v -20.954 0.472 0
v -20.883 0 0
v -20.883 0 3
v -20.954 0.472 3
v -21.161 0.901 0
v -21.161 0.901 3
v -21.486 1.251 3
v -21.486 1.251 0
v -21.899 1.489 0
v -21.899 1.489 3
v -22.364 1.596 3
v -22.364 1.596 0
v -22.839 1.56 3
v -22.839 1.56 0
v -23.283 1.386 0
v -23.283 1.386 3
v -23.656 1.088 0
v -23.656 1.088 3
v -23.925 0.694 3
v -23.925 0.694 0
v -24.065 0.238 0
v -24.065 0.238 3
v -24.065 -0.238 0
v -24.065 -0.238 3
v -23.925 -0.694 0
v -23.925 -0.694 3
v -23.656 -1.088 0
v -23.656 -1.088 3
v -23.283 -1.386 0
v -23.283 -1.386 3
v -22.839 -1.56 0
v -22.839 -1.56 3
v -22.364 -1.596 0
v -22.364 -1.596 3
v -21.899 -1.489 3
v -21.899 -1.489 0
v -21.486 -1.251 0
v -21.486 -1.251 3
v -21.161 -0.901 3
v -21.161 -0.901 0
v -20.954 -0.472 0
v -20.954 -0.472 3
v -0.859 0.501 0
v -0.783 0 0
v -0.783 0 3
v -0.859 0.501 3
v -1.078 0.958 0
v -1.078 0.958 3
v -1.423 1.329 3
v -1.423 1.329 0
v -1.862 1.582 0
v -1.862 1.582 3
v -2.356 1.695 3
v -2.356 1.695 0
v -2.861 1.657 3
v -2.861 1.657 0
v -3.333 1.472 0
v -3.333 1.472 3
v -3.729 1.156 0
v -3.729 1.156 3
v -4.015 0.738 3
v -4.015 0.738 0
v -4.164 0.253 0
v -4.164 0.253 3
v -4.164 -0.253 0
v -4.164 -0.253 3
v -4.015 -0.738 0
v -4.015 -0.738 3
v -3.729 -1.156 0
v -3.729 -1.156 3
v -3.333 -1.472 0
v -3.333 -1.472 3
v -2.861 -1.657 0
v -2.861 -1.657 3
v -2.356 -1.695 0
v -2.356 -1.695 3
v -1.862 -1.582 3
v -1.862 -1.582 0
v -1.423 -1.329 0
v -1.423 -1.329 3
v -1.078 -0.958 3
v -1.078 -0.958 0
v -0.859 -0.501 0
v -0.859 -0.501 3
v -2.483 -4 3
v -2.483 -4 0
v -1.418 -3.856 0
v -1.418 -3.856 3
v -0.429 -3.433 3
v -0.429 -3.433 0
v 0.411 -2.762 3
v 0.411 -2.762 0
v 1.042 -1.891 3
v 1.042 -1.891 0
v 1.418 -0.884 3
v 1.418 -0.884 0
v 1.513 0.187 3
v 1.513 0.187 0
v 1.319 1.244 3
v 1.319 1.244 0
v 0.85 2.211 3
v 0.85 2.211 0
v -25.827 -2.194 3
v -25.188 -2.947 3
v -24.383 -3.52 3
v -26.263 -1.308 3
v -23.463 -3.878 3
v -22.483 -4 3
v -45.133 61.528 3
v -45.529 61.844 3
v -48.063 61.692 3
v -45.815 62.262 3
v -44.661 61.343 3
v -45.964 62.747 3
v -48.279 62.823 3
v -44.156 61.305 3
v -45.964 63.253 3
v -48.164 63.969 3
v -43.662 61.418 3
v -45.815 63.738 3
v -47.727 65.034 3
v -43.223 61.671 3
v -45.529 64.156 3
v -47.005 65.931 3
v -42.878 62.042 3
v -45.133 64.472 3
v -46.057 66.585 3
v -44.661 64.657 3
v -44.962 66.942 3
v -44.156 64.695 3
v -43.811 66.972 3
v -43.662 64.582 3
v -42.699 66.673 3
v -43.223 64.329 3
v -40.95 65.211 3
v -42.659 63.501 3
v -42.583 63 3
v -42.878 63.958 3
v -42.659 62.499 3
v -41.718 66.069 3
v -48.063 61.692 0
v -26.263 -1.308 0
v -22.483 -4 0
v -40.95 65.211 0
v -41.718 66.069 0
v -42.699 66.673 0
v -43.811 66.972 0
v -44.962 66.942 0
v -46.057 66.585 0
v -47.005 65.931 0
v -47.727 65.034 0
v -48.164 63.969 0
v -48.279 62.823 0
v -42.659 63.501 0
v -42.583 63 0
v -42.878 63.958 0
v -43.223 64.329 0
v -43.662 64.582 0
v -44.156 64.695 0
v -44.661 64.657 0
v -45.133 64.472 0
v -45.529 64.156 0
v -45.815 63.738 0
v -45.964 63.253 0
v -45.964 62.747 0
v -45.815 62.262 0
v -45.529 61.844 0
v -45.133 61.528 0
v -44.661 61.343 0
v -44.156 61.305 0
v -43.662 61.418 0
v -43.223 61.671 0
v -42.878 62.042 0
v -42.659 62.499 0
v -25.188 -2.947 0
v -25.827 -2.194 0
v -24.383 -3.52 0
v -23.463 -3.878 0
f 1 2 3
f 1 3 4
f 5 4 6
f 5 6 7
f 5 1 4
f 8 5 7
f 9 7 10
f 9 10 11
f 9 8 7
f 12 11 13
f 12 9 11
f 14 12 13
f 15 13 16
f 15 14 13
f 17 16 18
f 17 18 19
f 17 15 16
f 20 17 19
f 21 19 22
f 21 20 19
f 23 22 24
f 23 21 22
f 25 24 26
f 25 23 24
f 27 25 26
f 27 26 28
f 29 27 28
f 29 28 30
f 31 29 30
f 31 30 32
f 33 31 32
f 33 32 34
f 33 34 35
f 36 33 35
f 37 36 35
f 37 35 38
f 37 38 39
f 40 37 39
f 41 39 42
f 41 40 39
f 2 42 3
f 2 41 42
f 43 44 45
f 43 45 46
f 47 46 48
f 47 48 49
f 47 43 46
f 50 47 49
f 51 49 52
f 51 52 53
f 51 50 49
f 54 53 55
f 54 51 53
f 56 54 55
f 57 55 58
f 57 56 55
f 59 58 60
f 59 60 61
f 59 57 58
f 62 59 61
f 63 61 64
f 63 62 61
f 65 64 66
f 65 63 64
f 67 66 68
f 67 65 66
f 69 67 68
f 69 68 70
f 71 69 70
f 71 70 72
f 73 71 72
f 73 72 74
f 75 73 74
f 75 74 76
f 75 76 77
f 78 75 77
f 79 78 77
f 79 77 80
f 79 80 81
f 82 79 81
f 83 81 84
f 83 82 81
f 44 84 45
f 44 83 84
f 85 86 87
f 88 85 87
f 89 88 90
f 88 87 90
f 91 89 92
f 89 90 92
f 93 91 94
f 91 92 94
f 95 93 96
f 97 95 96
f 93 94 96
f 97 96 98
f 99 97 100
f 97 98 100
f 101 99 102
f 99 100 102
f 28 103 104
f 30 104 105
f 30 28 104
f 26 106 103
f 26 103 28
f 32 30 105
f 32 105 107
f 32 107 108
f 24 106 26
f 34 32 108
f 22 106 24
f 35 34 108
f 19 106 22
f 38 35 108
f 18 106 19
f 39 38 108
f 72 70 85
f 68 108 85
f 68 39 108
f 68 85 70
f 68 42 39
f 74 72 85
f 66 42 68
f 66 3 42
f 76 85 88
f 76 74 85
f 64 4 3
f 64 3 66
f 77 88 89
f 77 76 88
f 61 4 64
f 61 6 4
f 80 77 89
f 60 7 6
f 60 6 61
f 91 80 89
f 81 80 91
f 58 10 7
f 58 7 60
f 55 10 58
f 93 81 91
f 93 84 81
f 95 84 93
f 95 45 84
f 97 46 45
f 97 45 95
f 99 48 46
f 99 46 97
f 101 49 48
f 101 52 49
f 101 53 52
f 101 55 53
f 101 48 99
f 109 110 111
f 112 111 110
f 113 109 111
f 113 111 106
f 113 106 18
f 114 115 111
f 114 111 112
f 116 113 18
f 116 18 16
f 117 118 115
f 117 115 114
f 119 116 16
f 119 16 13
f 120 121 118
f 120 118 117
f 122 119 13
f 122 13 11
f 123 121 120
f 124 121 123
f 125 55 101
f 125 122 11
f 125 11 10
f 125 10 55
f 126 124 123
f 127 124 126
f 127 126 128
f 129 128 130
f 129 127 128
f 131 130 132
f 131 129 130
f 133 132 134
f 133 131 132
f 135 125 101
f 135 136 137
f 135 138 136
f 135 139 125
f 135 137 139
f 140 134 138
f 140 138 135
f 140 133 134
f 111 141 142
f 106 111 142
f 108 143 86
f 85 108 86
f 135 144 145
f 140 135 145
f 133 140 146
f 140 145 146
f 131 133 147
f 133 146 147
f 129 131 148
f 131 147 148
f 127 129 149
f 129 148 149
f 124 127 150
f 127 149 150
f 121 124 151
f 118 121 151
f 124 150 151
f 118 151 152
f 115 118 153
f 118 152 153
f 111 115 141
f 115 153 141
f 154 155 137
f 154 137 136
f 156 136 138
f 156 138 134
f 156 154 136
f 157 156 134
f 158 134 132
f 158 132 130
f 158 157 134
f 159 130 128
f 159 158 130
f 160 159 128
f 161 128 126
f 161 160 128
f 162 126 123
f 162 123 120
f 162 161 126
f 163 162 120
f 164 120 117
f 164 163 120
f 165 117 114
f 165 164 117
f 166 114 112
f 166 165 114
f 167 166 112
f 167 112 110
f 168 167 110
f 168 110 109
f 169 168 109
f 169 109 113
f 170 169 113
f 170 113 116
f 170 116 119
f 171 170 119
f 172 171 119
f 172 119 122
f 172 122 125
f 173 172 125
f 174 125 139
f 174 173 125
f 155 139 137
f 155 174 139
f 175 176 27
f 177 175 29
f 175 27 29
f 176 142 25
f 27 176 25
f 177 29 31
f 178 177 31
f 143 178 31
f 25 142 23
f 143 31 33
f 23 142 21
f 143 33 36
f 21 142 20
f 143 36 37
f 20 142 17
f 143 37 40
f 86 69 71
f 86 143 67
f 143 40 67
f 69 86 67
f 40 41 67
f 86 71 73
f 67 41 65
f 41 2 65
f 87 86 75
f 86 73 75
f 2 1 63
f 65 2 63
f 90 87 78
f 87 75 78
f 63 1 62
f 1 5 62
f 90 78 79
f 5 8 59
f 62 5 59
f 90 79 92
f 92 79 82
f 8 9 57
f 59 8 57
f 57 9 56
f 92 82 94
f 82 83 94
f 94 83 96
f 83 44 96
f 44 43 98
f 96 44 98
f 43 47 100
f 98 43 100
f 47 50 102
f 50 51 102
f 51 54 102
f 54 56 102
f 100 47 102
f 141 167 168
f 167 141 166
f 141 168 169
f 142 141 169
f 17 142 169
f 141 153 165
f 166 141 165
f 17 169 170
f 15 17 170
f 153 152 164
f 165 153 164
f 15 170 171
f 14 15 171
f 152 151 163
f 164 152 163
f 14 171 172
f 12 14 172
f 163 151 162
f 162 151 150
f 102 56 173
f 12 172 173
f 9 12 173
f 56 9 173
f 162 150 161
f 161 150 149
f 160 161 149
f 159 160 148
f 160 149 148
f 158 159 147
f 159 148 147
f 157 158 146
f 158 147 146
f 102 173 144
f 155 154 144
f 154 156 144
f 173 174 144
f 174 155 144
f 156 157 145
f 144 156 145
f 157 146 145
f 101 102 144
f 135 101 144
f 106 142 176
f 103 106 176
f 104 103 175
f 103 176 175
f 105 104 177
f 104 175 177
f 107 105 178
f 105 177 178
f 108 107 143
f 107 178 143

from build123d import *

# Parameters (mm, degrees)
SKETCH_1_R      = 1.6
SKETCH_1_R_2    = 1.7
SKETCH_1_R_3    = 4
EXTRUDE_1_DEPTH = 3


with BuildPart() as part:
    # 草图1 → 凸台-拉伸1 (new body)
    # profile 1 of 3: a face of its own
    with BuildSketch(Plane.XY):
        with BuildLine():
            Line((-2.4830952, 4), (-22.4830952, 4))
            ThreePointArc((-22.4830952, 4), (-25.741324807, 2.320331836), (-26.263182143, -1.308030085))
            ThreePointArc((-26.263182143, -1.308030085), (-24.803427036, -3.258229607), (-22.4830952, -4))
            Line((-22.4830952, -4), (-2.4830952, -4))
            ThreePointArc((-2.4830952, -4), (1.041523919, -1.891311732), (0.849981545, 2.211469967))
            ThreePointArc((0.849981545, 2.211469967), (-0.591783468, 3.524619119), (-2.4830952, 4))
        make_face()
        with Locations((-22.4830952, 0)):
            Circle(SKETCH_1_R, mode=Mode.SUBTRACT)
        with Locations((-2.4830952, 0)):
            Circle(SKETCH_1_R_2, mode=Mode.SUBTRACT)
    # profile 2 of 3: a face of its own
    with BuildSketch(Plane.XY):
        with BuildLine():
            ThreePointArc((-26.263182143, -1.308030085), (-25.741324807, 2.320331836), (-22.4830952, 4))
            Line((-22.4830952, 4), (-2.4830952, 4))
            ThreePointArc((-2.4830952, 4), (-0.591783468, 3.524619119), (0.849981545, 2.211469967))
            Line((0.849981545, 2.211469967), (-40.950018455, 65.211469967))
            ThreePointArc((-40.950018455, 65.211469967), (-40.453453769, 64.154922729), (-40.2830952, 63))
            ThreePointArc((-40.2830952, 63), (-43.619901326, 59.055361374), (-48.063182143, 61.691969915))
            Line((-48.063182143, 61.691969915), (-26.263182143, -1.308030085))
        make_face()
    # profile 3 of 3: a face of its own
    with BuildSketch(Plane.XY):
        with Locations((-44.2830952, 63)):
            Circle(SKETCH_1_R_3)
        with Locations((-44.2830952, 63)):
            Circle(SKETCH_1_R_2, mode=Mode.SUBTRACT)
    extrude(amount=EXTRUDE_1_DEPTH)


solid = part.part
